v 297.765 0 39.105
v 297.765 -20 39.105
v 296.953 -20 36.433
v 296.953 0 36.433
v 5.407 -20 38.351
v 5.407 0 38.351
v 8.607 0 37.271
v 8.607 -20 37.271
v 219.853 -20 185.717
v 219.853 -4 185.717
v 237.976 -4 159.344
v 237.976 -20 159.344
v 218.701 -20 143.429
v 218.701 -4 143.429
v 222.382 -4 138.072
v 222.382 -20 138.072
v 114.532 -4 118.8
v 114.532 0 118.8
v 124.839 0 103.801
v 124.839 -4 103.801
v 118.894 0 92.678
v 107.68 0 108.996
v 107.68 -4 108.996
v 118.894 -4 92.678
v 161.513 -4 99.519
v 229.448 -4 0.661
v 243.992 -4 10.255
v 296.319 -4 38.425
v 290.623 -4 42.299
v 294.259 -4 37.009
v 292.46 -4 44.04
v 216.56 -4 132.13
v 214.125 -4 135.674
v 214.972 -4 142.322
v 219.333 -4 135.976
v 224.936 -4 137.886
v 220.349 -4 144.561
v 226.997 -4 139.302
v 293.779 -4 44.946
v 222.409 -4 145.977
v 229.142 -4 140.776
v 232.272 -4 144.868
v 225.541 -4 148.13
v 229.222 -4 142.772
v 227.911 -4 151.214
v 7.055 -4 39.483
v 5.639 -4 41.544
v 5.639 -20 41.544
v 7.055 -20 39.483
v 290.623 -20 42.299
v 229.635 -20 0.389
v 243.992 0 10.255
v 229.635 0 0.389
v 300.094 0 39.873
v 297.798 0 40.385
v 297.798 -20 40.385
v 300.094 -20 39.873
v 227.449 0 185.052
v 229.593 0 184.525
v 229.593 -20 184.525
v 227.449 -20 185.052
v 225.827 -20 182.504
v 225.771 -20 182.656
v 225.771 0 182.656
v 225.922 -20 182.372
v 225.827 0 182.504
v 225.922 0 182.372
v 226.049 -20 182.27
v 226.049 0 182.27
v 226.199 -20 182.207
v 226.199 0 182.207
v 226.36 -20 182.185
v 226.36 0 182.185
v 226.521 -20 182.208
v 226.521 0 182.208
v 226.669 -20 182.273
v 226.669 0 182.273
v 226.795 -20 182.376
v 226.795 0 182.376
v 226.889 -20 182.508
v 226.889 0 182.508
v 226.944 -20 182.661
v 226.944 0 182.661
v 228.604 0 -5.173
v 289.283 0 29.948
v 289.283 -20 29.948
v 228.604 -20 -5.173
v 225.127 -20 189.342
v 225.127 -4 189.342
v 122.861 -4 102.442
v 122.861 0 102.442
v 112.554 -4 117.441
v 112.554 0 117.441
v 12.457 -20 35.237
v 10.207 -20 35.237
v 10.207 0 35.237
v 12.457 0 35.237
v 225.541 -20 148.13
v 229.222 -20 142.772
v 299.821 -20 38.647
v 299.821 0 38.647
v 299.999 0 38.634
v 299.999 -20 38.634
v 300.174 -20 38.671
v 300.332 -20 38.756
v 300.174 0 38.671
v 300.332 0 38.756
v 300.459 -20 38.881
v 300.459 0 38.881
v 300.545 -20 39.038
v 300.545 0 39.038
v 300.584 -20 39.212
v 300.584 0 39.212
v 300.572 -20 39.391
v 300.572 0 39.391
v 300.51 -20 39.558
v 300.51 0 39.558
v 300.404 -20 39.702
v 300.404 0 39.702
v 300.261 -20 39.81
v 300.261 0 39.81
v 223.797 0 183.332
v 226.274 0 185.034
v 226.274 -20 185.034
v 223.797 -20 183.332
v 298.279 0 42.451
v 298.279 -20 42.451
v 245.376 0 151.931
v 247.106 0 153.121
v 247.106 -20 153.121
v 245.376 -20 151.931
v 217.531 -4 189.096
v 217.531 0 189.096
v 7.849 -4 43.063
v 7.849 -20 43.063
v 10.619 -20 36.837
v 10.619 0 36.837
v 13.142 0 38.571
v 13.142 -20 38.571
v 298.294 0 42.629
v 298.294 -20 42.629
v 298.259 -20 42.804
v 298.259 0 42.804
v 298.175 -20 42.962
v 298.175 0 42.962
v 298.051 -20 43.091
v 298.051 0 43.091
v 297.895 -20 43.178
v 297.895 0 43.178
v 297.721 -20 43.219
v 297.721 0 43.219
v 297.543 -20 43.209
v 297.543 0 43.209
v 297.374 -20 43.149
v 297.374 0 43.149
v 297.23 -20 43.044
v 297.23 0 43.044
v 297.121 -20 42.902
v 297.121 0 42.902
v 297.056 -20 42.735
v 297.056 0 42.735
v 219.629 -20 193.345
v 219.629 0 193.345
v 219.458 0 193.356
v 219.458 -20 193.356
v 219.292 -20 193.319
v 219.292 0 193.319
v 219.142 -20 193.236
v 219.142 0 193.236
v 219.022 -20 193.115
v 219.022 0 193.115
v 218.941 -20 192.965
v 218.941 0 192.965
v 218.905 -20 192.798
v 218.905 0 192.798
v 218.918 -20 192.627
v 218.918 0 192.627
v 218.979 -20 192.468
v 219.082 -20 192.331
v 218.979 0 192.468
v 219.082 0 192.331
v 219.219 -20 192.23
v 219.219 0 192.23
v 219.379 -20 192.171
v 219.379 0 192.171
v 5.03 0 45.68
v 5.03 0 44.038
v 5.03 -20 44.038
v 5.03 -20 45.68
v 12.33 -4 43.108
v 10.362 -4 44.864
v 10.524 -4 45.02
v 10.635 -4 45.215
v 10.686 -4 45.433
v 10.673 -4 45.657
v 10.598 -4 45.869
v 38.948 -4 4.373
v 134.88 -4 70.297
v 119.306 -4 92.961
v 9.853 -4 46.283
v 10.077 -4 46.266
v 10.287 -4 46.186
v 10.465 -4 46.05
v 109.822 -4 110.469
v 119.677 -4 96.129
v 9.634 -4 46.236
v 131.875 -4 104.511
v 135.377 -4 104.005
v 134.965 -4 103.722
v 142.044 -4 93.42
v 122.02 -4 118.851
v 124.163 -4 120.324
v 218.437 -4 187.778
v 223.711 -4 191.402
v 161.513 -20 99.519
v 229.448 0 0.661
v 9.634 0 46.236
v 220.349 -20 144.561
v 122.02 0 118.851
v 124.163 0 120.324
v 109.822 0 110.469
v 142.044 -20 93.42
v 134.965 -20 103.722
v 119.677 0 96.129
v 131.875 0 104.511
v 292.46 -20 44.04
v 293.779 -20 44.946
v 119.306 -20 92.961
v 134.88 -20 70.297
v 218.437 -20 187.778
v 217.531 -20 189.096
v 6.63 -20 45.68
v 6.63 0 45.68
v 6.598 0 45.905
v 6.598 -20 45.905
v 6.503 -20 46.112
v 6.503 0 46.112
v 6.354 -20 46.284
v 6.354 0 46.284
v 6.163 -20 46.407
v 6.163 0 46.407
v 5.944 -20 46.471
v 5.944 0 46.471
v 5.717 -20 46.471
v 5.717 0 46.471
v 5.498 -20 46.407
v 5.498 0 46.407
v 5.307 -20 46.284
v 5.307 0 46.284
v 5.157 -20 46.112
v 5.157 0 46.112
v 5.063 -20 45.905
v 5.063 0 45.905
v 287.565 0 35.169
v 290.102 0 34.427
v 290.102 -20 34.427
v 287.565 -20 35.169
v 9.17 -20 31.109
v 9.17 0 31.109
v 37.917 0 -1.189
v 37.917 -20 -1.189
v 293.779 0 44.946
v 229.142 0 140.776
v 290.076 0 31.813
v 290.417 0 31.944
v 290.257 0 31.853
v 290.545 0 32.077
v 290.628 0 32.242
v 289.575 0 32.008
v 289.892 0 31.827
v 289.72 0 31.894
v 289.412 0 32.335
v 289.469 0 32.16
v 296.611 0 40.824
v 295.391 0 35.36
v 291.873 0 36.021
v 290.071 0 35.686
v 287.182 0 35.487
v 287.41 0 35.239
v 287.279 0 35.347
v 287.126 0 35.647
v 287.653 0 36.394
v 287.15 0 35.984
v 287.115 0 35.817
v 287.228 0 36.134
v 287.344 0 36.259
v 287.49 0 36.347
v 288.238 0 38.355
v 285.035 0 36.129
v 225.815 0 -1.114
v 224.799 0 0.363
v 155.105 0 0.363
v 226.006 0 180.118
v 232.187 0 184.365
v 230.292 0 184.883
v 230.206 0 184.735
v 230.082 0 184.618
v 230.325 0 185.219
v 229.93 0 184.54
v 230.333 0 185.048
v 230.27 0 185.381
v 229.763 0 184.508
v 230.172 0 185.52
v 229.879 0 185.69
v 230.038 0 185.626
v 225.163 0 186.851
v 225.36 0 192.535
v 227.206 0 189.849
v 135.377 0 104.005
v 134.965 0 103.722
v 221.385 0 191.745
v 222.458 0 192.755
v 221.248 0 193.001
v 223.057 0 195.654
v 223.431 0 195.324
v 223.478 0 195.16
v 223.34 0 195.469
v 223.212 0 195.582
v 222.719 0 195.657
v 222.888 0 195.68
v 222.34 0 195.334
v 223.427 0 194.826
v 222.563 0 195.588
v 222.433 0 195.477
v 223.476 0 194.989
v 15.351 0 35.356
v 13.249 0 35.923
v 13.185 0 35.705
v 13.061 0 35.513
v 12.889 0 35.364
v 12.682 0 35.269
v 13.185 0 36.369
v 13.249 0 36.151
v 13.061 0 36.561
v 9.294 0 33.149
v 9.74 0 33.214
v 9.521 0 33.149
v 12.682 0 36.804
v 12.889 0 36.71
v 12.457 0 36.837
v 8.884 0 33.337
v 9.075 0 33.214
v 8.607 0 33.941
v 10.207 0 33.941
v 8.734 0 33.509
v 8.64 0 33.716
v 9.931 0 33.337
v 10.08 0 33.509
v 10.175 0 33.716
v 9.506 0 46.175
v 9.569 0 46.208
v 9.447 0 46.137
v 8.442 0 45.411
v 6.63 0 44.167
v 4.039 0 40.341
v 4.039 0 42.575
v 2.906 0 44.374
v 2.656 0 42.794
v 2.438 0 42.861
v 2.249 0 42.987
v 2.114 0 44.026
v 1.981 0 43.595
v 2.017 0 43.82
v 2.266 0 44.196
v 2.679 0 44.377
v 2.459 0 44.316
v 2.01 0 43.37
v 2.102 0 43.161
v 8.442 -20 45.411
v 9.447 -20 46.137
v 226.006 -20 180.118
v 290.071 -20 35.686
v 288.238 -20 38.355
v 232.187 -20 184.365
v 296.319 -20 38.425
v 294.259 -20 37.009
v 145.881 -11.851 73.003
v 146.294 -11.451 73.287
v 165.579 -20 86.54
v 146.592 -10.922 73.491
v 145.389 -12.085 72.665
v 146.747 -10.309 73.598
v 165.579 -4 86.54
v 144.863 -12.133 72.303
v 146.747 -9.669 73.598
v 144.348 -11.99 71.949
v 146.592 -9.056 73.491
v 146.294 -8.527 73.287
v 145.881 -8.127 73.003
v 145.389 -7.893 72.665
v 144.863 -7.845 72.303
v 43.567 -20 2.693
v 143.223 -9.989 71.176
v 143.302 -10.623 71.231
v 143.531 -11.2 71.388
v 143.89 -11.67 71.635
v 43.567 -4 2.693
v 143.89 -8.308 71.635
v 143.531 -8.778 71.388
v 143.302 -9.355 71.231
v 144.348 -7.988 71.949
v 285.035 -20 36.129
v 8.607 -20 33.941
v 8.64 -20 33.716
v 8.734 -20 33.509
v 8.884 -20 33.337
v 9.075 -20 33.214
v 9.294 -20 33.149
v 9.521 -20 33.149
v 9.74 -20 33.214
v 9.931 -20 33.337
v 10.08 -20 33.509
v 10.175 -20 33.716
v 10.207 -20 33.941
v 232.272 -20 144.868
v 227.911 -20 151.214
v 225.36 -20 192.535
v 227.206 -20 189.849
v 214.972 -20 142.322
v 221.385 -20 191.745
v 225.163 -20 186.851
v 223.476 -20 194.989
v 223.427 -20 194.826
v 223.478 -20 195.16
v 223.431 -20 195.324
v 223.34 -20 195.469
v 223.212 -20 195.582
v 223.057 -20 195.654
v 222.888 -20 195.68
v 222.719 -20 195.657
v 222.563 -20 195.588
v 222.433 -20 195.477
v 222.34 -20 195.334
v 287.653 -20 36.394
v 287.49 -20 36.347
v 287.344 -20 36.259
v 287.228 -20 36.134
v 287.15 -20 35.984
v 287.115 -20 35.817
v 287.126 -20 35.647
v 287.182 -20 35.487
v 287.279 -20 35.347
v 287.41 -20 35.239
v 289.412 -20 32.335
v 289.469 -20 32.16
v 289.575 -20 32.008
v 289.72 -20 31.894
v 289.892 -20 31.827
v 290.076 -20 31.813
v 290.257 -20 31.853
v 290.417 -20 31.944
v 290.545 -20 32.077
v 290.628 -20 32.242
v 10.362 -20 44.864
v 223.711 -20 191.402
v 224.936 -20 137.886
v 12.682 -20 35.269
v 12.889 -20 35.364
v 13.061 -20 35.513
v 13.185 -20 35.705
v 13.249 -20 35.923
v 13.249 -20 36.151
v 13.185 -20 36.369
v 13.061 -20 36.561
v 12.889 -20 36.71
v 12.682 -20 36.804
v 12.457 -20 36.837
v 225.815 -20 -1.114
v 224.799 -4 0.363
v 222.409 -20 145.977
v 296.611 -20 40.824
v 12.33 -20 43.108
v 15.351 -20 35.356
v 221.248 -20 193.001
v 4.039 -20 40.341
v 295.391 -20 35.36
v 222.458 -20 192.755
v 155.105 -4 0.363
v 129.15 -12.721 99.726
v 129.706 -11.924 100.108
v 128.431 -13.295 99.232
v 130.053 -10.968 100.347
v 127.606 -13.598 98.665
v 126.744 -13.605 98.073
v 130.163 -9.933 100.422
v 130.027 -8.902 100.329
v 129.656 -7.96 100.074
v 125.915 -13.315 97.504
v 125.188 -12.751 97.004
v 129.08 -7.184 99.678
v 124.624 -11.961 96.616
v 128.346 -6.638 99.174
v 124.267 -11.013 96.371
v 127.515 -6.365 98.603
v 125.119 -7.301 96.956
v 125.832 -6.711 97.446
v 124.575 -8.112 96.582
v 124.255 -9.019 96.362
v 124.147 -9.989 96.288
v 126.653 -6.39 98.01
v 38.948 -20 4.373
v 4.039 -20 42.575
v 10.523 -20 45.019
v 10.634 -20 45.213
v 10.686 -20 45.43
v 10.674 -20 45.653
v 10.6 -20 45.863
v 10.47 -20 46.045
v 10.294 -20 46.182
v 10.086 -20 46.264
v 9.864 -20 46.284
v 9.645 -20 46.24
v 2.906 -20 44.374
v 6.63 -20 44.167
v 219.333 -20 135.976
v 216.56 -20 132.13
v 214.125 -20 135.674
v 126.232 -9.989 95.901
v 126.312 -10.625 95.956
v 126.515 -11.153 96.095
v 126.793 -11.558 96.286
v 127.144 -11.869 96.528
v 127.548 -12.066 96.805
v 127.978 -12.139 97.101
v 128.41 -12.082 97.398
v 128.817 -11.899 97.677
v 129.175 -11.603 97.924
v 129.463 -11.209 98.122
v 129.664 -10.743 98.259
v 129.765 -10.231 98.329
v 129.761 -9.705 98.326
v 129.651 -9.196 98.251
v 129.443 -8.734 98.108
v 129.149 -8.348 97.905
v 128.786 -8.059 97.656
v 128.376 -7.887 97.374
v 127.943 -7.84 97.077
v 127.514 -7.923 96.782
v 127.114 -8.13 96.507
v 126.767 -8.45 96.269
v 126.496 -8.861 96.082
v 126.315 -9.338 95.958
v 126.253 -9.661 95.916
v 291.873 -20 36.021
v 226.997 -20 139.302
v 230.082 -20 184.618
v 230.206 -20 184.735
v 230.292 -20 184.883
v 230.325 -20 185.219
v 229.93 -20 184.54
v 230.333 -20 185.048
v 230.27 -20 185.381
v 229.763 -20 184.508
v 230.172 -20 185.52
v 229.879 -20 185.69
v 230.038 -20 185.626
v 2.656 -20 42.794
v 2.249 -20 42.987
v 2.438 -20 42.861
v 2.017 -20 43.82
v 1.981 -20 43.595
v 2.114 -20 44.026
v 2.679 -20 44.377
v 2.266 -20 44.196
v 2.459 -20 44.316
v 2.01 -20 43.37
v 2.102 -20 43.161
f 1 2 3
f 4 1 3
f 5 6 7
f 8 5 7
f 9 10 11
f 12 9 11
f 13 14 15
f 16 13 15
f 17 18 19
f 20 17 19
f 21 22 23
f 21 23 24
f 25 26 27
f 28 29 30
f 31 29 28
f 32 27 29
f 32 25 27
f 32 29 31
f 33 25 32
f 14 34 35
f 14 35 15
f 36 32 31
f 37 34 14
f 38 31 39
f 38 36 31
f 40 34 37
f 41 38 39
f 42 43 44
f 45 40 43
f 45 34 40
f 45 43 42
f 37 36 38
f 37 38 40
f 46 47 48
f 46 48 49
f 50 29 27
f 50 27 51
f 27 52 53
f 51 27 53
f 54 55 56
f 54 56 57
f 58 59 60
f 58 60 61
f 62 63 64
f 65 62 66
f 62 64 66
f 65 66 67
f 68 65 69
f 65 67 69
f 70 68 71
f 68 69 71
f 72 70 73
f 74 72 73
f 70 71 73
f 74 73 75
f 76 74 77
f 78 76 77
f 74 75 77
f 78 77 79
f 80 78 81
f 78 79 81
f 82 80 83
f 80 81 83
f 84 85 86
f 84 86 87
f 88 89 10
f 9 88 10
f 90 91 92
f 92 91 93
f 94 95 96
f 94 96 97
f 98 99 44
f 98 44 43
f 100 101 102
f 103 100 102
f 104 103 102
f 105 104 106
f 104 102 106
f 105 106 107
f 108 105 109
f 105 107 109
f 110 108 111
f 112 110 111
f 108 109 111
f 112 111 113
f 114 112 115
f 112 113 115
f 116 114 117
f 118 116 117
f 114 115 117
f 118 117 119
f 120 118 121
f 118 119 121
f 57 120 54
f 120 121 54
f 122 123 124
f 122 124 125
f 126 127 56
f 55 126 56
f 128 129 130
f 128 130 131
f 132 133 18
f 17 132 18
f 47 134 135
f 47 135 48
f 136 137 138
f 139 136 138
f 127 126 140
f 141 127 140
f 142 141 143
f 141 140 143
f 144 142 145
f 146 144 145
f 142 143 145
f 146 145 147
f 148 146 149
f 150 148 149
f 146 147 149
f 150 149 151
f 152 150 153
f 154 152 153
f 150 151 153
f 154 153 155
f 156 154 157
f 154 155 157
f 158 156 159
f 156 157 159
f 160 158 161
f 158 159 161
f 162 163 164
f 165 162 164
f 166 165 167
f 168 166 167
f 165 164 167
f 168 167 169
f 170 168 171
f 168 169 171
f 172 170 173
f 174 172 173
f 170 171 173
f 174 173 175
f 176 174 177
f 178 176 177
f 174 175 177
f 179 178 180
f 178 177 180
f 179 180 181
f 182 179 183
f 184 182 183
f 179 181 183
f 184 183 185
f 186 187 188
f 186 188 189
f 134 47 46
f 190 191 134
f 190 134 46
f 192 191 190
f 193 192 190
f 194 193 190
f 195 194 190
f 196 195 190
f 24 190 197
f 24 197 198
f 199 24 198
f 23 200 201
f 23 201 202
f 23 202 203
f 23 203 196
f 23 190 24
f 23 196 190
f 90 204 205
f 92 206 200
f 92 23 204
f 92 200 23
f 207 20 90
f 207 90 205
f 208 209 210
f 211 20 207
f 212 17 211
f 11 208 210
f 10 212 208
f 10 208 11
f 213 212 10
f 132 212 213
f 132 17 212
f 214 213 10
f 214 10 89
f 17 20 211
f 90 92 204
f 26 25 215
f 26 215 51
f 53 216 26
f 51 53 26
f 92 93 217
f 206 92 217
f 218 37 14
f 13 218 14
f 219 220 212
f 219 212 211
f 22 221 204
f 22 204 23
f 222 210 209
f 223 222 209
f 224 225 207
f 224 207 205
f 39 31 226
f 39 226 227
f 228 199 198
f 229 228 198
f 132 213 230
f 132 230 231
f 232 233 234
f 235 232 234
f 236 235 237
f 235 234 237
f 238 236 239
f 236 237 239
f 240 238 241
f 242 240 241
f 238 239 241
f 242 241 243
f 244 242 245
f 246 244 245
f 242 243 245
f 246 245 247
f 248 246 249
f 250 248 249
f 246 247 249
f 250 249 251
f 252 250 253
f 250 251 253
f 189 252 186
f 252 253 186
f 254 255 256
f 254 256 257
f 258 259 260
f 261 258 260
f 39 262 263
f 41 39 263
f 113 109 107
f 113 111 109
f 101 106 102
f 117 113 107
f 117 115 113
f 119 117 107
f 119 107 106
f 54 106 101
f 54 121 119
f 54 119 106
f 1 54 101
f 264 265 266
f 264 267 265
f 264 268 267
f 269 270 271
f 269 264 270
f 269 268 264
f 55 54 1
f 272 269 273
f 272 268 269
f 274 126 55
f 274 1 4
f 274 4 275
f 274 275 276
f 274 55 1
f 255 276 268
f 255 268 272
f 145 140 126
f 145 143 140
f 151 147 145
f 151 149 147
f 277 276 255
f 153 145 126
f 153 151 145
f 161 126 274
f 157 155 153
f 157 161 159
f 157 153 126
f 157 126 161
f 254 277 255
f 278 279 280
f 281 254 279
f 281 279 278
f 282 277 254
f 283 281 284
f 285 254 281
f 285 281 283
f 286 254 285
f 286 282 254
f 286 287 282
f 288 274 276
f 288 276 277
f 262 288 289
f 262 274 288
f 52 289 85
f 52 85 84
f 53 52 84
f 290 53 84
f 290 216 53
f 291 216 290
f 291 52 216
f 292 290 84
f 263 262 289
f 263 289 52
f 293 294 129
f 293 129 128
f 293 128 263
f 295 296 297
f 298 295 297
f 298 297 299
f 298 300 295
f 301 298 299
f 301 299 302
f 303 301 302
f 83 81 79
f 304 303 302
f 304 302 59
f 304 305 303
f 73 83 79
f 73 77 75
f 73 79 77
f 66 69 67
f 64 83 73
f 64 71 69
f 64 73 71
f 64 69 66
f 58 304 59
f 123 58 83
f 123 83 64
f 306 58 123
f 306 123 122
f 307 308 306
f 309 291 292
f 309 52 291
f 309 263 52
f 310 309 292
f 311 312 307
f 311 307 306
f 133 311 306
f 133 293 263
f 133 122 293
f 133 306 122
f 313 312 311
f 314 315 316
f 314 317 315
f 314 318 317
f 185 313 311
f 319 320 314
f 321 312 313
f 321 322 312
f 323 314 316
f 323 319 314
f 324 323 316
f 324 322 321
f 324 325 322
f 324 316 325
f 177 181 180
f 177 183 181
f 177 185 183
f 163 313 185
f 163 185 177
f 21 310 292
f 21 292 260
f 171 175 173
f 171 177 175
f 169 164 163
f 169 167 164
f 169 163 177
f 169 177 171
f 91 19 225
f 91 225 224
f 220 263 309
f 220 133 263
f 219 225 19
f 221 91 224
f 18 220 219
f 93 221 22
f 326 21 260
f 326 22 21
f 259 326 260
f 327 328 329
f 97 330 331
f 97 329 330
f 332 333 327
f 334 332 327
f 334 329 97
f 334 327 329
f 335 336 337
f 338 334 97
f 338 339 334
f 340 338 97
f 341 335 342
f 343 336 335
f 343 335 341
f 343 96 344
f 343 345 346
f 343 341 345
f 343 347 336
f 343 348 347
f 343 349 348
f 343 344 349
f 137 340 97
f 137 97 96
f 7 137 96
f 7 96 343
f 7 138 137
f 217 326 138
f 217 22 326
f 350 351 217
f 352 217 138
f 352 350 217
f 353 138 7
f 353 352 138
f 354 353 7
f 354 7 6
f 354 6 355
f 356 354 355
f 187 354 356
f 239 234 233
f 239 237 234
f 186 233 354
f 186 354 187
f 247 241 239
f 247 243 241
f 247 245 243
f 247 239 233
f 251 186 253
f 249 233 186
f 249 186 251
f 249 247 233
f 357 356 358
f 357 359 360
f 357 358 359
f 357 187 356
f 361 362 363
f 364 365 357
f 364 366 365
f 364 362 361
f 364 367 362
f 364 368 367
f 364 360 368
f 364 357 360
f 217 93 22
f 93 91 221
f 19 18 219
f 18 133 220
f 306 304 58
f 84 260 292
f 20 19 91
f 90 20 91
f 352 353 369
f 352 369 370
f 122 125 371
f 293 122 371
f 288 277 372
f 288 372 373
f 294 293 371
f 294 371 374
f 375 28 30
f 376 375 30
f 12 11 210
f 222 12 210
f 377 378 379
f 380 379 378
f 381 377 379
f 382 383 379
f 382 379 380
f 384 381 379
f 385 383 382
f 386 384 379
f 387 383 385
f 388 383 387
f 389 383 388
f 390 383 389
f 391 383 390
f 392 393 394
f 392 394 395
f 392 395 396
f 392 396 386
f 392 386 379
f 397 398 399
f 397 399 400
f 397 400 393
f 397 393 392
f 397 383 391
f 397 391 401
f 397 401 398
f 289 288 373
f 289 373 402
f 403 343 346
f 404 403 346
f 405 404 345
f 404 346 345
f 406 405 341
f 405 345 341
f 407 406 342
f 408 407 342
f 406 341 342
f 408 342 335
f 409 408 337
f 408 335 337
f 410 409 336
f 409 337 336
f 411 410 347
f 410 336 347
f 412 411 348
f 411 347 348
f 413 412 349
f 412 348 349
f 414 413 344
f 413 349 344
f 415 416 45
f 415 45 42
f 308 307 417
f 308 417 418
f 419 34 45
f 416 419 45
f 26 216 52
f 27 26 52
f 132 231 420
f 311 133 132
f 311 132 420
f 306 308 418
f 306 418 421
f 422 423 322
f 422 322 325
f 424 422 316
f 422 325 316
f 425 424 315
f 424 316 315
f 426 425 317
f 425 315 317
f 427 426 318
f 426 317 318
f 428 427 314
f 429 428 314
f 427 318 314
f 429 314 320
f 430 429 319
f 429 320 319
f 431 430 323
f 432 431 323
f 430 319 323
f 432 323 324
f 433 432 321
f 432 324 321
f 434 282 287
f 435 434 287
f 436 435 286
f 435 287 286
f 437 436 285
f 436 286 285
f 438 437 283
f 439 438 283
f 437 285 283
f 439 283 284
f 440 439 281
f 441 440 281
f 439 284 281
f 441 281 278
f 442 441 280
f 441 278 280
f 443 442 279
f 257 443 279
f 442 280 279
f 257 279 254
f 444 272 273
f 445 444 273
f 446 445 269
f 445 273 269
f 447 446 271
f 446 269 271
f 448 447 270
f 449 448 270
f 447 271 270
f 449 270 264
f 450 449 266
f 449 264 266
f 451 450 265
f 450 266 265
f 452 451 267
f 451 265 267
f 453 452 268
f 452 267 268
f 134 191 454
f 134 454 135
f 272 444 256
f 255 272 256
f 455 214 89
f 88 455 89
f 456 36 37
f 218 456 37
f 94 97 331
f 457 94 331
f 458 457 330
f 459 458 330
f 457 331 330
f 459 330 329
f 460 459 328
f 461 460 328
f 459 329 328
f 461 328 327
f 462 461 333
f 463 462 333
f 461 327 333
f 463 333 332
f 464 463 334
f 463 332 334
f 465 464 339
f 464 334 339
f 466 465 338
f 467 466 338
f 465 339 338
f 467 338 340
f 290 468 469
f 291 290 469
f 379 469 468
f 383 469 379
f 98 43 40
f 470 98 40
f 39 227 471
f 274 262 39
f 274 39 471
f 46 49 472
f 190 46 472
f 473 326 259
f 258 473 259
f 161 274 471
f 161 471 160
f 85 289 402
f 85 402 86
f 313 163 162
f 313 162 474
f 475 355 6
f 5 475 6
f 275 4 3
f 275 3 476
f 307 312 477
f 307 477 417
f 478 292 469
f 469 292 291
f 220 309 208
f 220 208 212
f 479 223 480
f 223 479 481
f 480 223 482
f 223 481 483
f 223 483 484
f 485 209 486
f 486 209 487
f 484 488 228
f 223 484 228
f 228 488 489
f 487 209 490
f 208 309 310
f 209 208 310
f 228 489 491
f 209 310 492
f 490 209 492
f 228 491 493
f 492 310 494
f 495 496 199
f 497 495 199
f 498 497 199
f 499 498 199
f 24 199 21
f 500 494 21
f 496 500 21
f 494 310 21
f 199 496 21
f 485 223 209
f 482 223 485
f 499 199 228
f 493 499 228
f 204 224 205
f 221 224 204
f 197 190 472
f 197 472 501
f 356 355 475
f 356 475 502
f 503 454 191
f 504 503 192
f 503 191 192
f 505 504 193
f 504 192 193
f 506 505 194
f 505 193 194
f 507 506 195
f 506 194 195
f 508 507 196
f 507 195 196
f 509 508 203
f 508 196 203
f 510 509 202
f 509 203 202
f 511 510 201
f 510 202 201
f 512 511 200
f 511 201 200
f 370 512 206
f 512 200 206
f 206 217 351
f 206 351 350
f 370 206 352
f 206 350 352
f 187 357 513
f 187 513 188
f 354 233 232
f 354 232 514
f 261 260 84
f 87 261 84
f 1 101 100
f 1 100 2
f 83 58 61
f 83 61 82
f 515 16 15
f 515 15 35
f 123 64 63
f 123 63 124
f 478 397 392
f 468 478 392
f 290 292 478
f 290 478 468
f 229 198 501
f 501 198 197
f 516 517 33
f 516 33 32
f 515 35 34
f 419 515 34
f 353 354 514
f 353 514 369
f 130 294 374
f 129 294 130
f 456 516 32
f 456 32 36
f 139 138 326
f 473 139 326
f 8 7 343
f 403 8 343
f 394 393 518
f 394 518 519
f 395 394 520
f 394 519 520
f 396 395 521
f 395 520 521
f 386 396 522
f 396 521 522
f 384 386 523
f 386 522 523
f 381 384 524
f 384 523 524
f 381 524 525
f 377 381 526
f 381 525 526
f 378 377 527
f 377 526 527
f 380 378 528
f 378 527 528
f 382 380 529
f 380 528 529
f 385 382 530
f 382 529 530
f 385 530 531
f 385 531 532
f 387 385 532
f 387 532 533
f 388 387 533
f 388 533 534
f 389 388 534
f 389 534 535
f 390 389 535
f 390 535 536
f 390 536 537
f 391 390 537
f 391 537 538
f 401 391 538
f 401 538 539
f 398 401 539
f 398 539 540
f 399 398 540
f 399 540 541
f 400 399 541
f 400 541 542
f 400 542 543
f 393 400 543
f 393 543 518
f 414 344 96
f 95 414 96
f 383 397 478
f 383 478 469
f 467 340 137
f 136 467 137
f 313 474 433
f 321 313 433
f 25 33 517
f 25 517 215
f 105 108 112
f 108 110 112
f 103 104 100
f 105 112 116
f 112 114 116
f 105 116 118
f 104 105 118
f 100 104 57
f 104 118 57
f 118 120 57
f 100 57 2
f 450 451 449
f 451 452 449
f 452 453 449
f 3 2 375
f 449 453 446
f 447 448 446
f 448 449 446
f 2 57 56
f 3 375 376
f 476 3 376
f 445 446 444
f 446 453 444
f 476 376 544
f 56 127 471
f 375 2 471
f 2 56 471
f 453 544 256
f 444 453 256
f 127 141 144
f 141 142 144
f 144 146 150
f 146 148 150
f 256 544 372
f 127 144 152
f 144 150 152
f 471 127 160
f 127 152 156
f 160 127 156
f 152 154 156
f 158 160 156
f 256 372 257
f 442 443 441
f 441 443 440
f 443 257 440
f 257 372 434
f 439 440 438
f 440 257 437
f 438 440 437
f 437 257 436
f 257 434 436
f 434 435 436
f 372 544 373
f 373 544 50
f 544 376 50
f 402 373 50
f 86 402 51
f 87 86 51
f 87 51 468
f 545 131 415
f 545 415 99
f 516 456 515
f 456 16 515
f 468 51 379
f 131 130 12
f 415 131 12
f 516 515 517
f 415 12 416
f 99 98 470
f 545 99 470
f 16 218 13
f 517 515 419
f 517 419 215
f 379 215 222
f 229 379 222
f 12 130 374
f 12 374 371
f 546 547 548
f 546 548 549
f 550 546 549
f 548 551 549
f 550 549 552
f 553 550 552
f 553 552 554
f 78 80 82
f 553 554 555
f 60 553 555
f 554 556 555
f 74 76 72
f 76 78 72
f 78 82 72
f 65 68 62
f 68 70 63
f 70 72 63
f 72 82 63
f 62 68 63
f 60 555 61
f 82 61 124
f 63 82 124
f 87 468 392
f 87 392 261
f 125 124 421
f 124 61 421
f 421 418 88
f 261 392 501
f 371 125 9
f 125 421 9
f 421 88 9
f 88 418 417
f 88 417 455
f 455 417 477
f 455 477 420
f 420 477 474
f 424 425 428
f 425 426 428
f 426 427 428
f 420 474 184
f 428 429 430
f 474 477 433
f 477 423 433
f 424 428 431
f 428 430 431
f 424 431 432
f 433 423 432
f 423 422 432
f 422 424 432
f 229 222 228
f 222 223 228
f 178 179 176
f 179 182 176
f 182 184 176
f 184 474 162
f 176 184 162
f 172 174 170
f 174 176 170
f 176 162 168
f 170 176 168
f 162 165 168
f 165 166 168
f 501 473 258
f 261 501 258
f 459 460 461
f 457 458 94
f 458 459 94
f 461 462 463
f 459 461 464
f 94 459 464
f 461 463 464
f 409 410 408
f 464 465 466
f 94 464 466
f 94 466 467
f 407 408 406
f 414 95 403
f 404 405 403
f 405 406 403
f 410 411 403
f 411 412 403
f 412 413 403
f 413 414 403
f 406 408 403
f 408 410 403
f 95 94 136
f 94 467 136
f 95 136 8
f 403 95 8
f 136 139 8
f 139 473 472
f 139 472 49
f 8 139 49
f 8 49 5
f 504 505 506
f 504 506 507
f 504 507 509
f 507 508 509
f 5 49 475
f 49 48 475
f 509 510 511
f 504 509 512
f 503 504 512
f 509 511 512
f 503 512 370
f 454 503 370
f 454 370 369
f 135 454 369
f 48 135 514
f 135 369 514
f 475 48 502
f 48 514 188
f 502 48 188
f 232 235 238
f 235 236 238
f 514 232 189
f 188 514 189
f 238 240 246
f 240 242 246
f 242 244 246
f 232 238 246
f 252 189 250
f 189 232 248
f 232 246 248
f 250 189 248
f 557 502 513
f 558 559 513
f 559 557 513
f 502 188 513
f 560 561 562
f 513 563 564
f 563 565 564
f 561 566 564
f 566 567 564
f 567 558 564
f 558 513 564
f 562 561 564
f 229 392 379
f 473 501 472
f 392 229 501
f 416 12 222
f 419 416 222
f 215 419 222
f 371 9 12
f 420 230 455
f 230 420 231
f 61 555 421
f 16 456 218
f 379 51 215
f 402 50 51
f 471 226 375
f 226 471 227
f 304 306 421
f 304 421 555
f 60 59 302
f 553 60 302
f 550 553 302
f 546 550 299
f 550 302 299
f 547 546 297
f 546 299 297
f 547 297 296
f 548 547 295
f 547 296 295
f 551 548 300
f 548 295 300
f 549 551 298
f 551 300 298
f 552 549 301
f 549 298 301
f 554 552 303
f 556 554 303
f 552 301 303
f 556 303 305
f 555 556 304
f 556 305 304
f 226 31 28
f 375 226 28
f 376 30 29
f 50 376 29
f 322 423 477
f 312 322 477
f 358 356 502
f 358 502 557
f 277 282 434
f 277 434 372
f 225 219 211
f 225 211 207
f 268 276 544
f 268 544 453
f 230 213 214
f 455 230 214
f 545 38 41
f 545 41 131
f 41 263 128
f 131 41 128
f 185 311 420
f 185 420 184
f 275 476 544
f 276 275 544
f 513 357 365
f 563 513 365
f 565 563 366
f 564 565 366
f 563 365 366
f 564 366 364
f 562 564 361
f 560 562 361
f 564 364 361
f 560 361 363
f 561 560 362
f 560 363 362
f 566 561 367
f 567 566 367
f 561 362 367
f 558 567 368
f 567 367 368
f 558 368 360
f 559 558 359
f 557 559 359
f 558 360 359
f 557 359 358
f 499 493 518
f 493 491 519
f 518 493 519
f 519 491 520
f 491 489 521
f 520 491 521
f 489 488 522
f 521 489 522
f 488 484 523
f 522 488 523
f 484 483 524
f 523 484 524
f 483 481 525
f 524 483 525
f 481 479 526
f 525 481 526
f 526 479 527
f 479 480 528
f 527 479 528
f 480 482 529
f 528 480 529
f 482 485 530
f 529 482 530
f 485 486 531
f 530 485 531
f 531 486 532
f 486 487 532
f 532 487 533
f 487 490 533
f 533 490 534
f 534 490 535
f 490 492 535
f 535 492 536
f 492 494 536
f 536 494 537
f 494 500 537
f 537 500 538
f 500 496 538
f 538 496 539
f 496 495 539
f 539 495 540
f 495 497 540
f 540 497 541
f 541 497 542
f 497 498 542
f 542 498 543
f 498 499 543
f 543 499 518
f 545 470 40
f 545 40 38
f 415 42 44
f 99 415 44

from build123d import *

# Parameters (mm, degrees)
PAD_DEPTH    = 20
SKETCH001_R  = 2.15
POCKET_DEPTH = 47
CHAMFER_SIZE = 1.5
PAD001_DEPTH = 4


with BuildPart() as part:
    # Sketch → Pad (new body)
    with BuildSketch(Plane.XZ):
        with BuildLine():
            Line((4.0390093024, 42.5746936035), (2.6558476721, 42.7938363759))
            ThreePointArc((2.9062224976, 44.3741250985), (1.9908907236, 43.70916815), (2.6558476721, 42.7938363759))
            Line((2.9062224976, 44.3741250985), (5.030422984, 44.0375749994))
            Line((5.030422984, 44.0375749994), (5.030422984, 45.679507745))
            ThreePointArc((6.630422984, 45.679507745), (5.830422984, 46.479507745), (5.030422984, 45.679507745))
            Line((6.630422984, 45.679507745), (6.630422984, 44.1665554588))
            Line((6.630422984, 44.1665554588), (8.4415504736, 45.4111549307))
            Line((8.4415504736, 45.4111549307), (9.4473057083, 46.1365999544))
            ThreePointArc((10.36219, 44.864349), (10.5417900599, 45.9585758488), (9.4473057083, 46.1365999544))
            Line((10.36219, 44.864349), (7.8490460164, 43.0626150502))
            Line((7.8490460164, 43.0626150502), (5.6390093024, 41.5438867756))
            Line((5.6390093024, 41.5438867756), (7.0549059293, 39.4834895465))
            Line((7.0549059293, 39.4834895465), (12.3295228359, 43.1081849113))
            Line((12.3295228359, 43.1081849113), (38.9483794216, 4.3727170031))
            Line((134.8804744114, 70.2968639515), (38.9483794216, 4.3727170031))
            Line((119.3056115155, 92.9612334723), (134.8804744114, 70.2968639515))
            Line((134.9646304571, 103.7220478367), (119.3056115155, 92.9612334723))
            Line((142.0441135916, 93.4200616909), (134.9646304571, 103.7220478367))
            Line((237.9762085814, 159.3442086393), (142.0441135916, 93.4200616909))
            Line((219.8527317571, 185.7172931726), (237.9762085814, 159.3442086393))
            Line((225.1273486637, 189.3419885375), (219.8527317571, 185.7172931726))
            Line((223.7114520368, 191.4023857666), (225.1273486637, 189.3419885375))
            Line((218.4368351302, 187.7776904018), (223.7114520368, 191.4023857666))
            Line((218.4368351302, 187.7776904018), (217.5306612889, 189.0963446284))
            Line((217.5306612889, 189.0963446284), (221.3848485497, 191.7449264963))
            Line((221.3848485497, 191.7449264963), (219.3793189808, 192.1708640962))
            ThreePointArc((219.6286165225, 193.3446829646), (218.9170583175, 192.8824223013), (219.3793189808, 192.1708640962))
            Line((219.6286165225, 193.3446829646), (221.2482697259, 193.0006984087))
            Line((221.2482697259, 193.0006984087), (222.3395205202, 195.3340273515))
            ThreePointArc((223.4265178948, 194.8256606455), (223.1372025604, 195.6233426858), (222.3395205202, 195.3340273515))
            Line((223.4265178948, 194.8256606455), (222.4583086449, 192.755420993))
            Line((222.4583086449, 192.755420993), (225.3597698201, 192.5351030681))
            Line((225.3597698201, 192.5351030681), (227.2058553447, 189.8486996773))
            Line((227.2058553447, 189.8486996773), (225.1628423907, 186.850988034))
            Line((225.1628423907, 186.850988034), (229.8793547275, 185.6901341722))
            ThreePointArc((229.5925630359, 184.5249086465), (230.3185716445, 184.9641255636), (229.8793547275, 185.6901341722))
            Line((229.5925630359, 184.5249086465), (227.4493724265, 185.0524024636))
            Line((227.4493724265, 185.0524024636), (226.9439351411, 182.6613604036))
            ThreePointArc((225.7710395828, 182.6559948849), (226.3596521523, 182.1854572192), (226.9439351411, 182.6613604036))
            Line((225.7710395828, 182.6559948849), (226.2736384812, 185.0336095568))
            Line((226.2736384812, 185.0336095568), (223.7973399844, 183.331907264))
            Line((223.7973399844, 183.331907264), (226.0061387224, 180.1176875865))
            Line((226.0061387224, 180.1176875865), (232.1873304099, 184.3653774672))
            Line((232.1873304099, 184.3653774672), (247.1063382508, 153.1208066582))
            Line((247.1063382508, 153.1208066582), (245.3756045783, 151.9314534916))
            Line((226.9968612942, 139.3016555797), (245.3756045783, 151.9314534916))
            Line((222.4093562231, 145.9773426022), (226.9968612942, 139.3016555797))
            Line((225.5411600114, 148.1295054751), (222.4093562231, 145.9773426022))
            Line((229.2224912413, 142.7724726792), (225.5411600114, 148.1295054751))
            Line((232.2718791405, 144.867999687), (229.2224912413, 142.7724726792))
            Line((227.9109175296, 151.2140231529), (232.2718791405, 144.867999687))
            Line((214.9716229305, 142.3221923359), (227.9109175296, 151.2140231529))
            Line((219.3325845414, 135.9761688701), (214.9716229305, 142.3221923359))
            Line((222.3819724405, 138.0716958779), (219.3325845414, 135.9761688701))
            Line((218.7006412106, 143.4287286737), (222.3819724405, 138.0716958779))
            Line((220.3489589939, 144.5614459753), (218.7006412106, 143.4287286737))
            Line((224.9364640651, 137.8857589528), (220.3489589939, 144.5614459753))
            Line((216.5602719319, 132.1296736602), (224.9364640651, 137.8857589528))
            Line((214.1249297336, 135.6735568944), (216.5602719319, 132.1296736602))
            Line((214.1249297336, 135.6735568944), (161.5133638836, 99.5191020307))
            Line((161.5133638836, 99.5191020307), (229.6352159636, 0.3889306577))
            Line((290.6229739468, 42.2994708139), (229.6352159636, 0.3889306577))
            Line((294.258762918, 37.008710613), (290.6229739468, 42.2994708139))
            Line((296.3191601472, 38.4246072399), (294.258762918, 37.008710613))
            Line((292.4603634449, 44.0398858431), (296.3191601472, 38.4246072399))
            Line((292.4603634449, 44.0398858431), (293.7790176715, 44.9460596843))
            Line((293.7790176715, 44.9460596843), (296.6113530901, 40.8244762739))
            Line((296.6113530901, 40.8244762739), (297.055734393, 42.735476101))
            ThreePointArc((298.2789600102, 42.4510288783), (297.809570813, 43.2048652982), (297.055734393, 42.735476101))
            Line((298.2789600102, 42.4510288783), (297.7984698218, 40.3847478241))
            Line((297.7984698218, 40.3847478241), (300.0943558548, 39.8731393346))
            ThreePointArc((299.8212028325, 38.6473422227), (300.5706778996, 39.1236642674), (300.0943558548, 39.8731393346))
            Line((299.8212028325, 38.6473422227), (297.7654069564, 39.105449728))
            Line((297.7654069564, 39.105449728), (296.952983487, 36.4334515477))
            Line((296.952983487, 36.4334515477), (295.3914802195, 35.3603928297))
            Line((295.3914802195, 35.3603928297), (291.8734315191, 36.0212597001))
            Line((291.8734315191, 36.0212597001), (290.6278670782, 32.2423690465))
            ThreePointArc((289.4121870072, 32.3352401719), (289.9836654433, 31.8128324322), (290.6278670782, 32.2423690465))
            Line((289.4121870072, 32.3352401719), (290.1017184324, 34.427194448))
            Line((290.1017184324, 34.427194448), (287.5647756287, 35.1692737258))
            ThreePointArc((287.653171066, 36.3937007315), (287.1147629857, 35.8171659101), (287.5647756287, 35.1692737258))
            Line((287.653171066, 36.3937007315), (290.0713769403, 35.6863531059))
            Line((290.0713769403, 35.6863531059), (288.2375880383, 38.3548625865))
            Line((288.2375880383, 38.3548625865), (285.0350616215, 36.1290479439))
            Line((285.0350616215, 36.1290479439), (289.2827515022, 29.9478562564))
            Line((289.2827515022, 29.9478562564), (228.604015, -5.173139512))
            Line((37.917178458, -1.1893531666), (228.604015, -5.173139512))
            Line((9.1699343254, 31.1087265717), (37.917178458, -1.1893531666))
            Line((15.3511260129, 35.3564164524), (9.1699343254, 31.1087265717))
            Line((13.1423272749, 38.5706361299), (15.3511260129, 35.3564164524))
            Line((10.619338857, 36.8368487126), (13.1423272749, 38.5706361299))
            Line((12.4568191979, 36.8368487126), (10.619338857, 36.8368487126))
            ThreePointArc((12.4568191979, 35.2368487126), (13.2568191979, 36.0368487126), (12.4568191979, 36.8368487126))
            Line((10.2074312987, 35.2368487126), (12.4568191979, 35.2368487126))
            Line((10.2074312987, 33.9413217047), (10.2074312987, 35.2368487126))
            ThreePointArc((8.6074312987, 33.9413217047), (9.4074312987, 33.1413217047), (10.2074312987, 33.9413217047))
            Line((8.6074312987, 37.2714912173), (8.6074312987, 33.9413217047))
            Line((5.4065881459, 38.350772245), (8.6074312987, 37.2714912173))
            Line((4.0390093024, 40.3408579662), (5.4065881459, 38.350772245))
            Line((4.0390093024, 40.3408579662), (4.0390093024, 42.5746936035))
        make_face()
        Polygon((43.5674287195, 2.6934759176), (225.8145842591, -1.1139905174), (165.5793907768, 86.5396018361), align=None, mode=Mode.SUBTRACT)
    extrude(amount=PAD_DEPTH)

    # Sketch001 (on DatumPlane) → Pocket (cut)
    with BuildSketch(Plane(origin=(-5.1227490992, 0, 7.4545682568), x_dir=(-0.8241588917, 0, -0.5663586508), z_dir=(-0.5663586508, 0, 0.8241588917))):
        with Locations((-160.5, 9.9890381016)):
            Circle(SKETCH001_R)
    extrude(amount=-POCKET_DEPTH, mode=Mode.SUBTRACT)

    # Chamfer
    chamfer_edges = [part.edges().sort_by_distance(p)[0] for p in [
        (128.926695, -9.989038, 99.572803),
    ]]
    chamfer(chamfer_edges, length=CHAMFER_SIZE)

    # Sketch002 → Pad001 (join)
    with BuildSketch(Plane.XZ):
        Polygon((8.4415504736, 45.4111549307), (4.918851, 41.369339), (7.155737, 38.386826), (12.779469, 40.715076), (40.176517, 0.3632551244), (228.996323, 0.3632551244), (288.524261, 39.629669), (294.24765, 36.288891), (297.030212, 38.458557), (293.7790176715, 44.9460596843), (228.564316, 141.632828), (244.029541, 152.010803), (221.678513, 185.245819), (225.870392, 189.519104), (223.916901, 191.960983), (217.5306612889, 189.0963446284), (114.5322283976, 118.8000303552), (124.8392314819, 103.8013926071), (122.8612501419, 102.4421318452), (112.5542362208, 117.4407853631), align=None)
        Polygon((107.6796307846, 108.9964002019), (118.8935320696, 92.6780541469), (135.3767099029, 104.0052271621), (124.1628086179, 120.3235732171), (122.0199954996, 118.8510407251), (131.8746360228, 104.5106760101), (119.6770844261, 96.1285679789), (109.8224439029, 110.4689326938), align=None, mode=Mode.SUBTRACT)
    extrude(amount=PAD001_DEPTH)


solid = part.part
